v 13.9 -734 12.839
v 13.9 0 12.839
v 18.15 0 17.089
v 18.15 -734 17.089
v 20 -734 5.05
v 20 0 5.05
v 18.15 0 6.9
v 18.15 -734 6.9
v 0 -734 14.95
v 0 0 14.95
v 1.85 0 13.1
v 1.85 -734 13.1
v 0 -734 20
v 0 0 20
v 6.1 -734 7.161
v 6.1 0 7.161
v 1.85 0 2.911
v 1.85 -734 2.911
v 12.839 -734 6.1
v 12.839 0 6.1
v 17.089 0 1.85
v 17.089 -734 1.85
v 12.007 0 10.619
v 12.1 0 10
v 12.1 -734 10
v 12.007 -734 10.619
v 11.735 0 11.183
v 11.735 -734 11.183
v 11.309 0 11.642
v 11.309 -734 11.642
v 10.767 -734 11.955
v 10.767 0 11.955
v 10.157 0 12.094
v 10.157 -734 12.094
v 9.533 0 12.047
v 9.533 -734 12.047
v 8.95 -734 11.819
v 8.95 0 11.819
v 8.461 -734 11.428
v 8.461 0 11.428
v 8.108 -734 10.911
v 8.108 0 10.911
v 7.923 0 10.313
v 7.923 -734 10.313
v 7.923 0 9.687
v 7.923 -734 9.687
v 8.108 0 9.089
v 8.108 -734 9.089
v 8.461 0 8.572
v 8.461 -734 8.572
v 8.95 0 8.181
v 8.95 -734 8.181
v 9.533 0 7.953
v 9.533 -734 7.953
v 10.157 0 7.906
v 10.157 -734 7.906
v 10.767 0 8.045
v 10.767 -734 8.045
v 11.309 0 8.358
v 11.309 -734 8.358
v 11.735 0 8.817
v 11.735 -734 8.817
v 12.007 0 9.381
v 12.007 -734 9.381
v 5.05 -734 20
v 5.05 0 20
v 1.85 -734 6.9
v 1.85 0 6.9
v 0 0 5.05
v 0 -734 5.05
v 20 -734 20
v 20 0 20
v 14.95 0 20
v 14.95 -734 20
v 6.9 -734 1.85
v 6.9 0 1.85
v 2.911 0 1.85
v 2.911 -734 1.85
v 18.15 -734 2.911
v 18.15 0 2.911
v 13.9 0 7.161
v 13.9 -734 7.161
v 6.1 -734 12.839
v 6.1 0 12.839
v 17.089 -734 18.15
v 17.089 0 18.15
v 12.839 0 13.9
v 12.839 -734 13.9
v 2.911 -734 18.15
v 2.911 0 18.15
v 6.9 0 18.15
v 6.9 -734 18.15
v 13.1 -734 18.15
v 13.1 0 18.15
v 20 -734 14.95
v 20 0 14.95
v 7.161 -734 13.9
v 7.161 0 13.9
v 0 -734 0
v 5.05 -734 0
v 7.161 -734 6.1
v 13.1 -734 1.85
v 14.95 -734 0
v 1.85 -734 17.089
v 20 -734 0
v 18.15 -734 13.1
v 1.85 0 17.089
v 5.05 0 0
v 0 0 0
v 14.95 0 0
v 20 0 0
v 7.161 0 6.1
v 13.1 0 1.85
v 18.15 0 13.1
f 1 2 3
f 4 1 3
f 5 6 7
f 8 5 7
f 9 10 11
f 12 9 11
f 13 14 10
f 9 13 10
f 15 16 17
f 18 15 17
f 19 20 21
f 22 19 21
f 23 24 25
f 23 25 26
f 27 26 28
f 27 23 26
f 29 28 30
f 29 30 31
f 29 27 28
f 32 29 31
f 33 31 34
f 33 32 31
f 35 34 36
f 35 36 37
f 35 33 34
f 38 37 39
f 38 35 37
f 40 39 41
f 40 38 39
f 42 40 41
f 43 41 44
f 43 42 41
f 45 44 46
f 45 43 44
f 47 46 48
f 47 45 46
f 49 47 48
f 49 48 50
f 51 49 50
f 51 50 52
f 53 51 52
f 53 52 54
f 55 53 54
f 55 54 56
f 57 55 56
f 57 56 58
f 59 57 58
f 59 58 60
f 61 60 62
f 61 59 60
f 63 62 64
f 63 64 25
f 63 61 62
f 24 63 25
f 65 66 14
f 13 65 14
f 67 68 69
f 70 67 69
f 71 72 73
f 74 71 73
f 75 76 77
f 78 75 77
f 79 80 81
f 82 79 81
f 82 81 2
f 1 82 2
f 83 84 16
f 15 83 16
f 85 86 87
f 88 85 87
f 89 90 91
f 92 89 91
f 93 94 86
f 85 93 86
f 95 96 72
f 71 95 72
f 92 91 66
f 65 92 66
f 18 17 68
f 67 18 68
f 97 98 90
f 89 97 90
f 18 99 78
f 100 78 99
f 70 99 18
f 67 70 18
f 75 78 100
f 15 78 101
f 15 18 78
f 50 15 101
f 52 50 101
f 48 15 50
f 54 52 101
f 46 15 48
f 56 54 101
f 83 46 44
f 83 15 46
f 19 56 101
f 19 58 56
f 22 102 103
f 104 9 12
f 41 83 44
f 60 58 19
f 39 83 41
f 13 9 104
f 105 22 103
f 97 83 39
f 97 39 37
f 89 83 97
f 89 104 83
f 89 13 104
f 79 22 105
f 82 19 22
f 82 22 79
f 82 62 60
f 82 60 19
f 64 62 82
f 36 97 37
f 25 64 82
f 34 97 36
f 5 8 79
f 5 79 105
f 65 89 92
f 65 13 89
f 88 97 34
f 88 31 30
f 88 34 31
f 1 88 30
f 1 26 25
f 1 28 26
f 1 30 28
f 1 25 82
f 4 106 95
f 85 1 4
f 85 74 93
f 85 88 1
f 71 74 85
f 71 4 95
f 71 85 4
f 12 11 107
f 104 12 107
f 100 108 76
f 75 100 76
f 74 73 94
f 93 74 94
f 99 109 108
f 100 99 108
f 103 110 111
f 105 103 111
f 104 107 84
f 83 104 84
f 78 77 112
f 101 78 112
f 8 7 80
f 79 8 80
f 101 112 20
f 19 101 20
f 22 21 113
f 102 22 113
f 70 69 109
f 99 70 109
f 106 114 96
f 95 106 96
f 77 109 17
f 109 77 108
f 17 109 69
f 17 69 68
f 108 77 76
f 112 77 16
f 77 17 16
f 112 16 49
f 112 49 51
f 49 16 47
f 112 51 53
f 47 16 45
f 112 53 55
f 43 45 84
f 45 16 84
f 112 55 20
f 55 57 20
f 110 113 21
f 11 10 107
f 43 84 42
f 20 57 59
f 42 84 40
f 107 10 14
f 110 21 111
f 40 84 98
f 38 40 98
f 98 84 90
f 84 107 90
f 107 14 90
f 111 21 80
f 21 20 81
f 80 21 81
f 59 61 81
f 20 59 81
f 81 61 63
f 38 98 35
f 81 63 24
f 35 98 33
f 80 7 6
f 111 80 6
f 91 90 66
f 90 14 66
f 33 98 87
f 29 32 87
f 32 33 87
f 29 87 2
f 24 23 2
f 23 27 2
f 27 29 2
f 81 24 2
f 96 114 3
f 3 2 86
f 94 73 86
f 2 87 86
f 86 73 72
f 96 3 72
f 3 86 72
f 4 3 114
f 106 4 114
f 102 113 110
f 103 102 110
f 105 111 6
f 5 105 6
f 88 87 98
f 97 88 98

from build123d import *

# Parameters (mm, degrees)
SKETCH_R  = 2.1
PAD_DEPTH = 734


with BuildPart() as part:
    # Sketch → Pad (new body)
    with BuildSketch(Plane.XZ):
        Polygon((0, 0), (5.05, 0), (6.9, 1.85), (2.91066, 1.85), (7.16066, 6.1), (12.83934, 6.1), (17.08934, 1.85), (13.1, 1.85), (14.95, 0), (20, 0), (20, 5.05), (18.15, 6.9), (18.15, 2.91066), (13.9, 7.16066), (13.9, 12.83934), (18.15, 17.08934), (18.15, 13.1), (20, 14.95), (20, 20), (14.95, 20), (13.1, 18.15), (17.08934, 18.15), (12.83934, 13.9), (7.16066, 13.9), (2.91066, 18.15), (6.9, 18.15), (5.05, 20), (0, 20), (0, 14.95), (1.85, 13.1), (1.85, 17.08934), (6.1, 12.83934), (6.1, 7.16066), (1.85, 2.91066), (1.85, 6.9), (0, 5.05), align=None)
        with Locations((10, 10)):
            Circle(SKETCH_R, mode=Mode.SUBTRACT)
    extrude(amount=PAD_DEPTH)


solid = part.part
